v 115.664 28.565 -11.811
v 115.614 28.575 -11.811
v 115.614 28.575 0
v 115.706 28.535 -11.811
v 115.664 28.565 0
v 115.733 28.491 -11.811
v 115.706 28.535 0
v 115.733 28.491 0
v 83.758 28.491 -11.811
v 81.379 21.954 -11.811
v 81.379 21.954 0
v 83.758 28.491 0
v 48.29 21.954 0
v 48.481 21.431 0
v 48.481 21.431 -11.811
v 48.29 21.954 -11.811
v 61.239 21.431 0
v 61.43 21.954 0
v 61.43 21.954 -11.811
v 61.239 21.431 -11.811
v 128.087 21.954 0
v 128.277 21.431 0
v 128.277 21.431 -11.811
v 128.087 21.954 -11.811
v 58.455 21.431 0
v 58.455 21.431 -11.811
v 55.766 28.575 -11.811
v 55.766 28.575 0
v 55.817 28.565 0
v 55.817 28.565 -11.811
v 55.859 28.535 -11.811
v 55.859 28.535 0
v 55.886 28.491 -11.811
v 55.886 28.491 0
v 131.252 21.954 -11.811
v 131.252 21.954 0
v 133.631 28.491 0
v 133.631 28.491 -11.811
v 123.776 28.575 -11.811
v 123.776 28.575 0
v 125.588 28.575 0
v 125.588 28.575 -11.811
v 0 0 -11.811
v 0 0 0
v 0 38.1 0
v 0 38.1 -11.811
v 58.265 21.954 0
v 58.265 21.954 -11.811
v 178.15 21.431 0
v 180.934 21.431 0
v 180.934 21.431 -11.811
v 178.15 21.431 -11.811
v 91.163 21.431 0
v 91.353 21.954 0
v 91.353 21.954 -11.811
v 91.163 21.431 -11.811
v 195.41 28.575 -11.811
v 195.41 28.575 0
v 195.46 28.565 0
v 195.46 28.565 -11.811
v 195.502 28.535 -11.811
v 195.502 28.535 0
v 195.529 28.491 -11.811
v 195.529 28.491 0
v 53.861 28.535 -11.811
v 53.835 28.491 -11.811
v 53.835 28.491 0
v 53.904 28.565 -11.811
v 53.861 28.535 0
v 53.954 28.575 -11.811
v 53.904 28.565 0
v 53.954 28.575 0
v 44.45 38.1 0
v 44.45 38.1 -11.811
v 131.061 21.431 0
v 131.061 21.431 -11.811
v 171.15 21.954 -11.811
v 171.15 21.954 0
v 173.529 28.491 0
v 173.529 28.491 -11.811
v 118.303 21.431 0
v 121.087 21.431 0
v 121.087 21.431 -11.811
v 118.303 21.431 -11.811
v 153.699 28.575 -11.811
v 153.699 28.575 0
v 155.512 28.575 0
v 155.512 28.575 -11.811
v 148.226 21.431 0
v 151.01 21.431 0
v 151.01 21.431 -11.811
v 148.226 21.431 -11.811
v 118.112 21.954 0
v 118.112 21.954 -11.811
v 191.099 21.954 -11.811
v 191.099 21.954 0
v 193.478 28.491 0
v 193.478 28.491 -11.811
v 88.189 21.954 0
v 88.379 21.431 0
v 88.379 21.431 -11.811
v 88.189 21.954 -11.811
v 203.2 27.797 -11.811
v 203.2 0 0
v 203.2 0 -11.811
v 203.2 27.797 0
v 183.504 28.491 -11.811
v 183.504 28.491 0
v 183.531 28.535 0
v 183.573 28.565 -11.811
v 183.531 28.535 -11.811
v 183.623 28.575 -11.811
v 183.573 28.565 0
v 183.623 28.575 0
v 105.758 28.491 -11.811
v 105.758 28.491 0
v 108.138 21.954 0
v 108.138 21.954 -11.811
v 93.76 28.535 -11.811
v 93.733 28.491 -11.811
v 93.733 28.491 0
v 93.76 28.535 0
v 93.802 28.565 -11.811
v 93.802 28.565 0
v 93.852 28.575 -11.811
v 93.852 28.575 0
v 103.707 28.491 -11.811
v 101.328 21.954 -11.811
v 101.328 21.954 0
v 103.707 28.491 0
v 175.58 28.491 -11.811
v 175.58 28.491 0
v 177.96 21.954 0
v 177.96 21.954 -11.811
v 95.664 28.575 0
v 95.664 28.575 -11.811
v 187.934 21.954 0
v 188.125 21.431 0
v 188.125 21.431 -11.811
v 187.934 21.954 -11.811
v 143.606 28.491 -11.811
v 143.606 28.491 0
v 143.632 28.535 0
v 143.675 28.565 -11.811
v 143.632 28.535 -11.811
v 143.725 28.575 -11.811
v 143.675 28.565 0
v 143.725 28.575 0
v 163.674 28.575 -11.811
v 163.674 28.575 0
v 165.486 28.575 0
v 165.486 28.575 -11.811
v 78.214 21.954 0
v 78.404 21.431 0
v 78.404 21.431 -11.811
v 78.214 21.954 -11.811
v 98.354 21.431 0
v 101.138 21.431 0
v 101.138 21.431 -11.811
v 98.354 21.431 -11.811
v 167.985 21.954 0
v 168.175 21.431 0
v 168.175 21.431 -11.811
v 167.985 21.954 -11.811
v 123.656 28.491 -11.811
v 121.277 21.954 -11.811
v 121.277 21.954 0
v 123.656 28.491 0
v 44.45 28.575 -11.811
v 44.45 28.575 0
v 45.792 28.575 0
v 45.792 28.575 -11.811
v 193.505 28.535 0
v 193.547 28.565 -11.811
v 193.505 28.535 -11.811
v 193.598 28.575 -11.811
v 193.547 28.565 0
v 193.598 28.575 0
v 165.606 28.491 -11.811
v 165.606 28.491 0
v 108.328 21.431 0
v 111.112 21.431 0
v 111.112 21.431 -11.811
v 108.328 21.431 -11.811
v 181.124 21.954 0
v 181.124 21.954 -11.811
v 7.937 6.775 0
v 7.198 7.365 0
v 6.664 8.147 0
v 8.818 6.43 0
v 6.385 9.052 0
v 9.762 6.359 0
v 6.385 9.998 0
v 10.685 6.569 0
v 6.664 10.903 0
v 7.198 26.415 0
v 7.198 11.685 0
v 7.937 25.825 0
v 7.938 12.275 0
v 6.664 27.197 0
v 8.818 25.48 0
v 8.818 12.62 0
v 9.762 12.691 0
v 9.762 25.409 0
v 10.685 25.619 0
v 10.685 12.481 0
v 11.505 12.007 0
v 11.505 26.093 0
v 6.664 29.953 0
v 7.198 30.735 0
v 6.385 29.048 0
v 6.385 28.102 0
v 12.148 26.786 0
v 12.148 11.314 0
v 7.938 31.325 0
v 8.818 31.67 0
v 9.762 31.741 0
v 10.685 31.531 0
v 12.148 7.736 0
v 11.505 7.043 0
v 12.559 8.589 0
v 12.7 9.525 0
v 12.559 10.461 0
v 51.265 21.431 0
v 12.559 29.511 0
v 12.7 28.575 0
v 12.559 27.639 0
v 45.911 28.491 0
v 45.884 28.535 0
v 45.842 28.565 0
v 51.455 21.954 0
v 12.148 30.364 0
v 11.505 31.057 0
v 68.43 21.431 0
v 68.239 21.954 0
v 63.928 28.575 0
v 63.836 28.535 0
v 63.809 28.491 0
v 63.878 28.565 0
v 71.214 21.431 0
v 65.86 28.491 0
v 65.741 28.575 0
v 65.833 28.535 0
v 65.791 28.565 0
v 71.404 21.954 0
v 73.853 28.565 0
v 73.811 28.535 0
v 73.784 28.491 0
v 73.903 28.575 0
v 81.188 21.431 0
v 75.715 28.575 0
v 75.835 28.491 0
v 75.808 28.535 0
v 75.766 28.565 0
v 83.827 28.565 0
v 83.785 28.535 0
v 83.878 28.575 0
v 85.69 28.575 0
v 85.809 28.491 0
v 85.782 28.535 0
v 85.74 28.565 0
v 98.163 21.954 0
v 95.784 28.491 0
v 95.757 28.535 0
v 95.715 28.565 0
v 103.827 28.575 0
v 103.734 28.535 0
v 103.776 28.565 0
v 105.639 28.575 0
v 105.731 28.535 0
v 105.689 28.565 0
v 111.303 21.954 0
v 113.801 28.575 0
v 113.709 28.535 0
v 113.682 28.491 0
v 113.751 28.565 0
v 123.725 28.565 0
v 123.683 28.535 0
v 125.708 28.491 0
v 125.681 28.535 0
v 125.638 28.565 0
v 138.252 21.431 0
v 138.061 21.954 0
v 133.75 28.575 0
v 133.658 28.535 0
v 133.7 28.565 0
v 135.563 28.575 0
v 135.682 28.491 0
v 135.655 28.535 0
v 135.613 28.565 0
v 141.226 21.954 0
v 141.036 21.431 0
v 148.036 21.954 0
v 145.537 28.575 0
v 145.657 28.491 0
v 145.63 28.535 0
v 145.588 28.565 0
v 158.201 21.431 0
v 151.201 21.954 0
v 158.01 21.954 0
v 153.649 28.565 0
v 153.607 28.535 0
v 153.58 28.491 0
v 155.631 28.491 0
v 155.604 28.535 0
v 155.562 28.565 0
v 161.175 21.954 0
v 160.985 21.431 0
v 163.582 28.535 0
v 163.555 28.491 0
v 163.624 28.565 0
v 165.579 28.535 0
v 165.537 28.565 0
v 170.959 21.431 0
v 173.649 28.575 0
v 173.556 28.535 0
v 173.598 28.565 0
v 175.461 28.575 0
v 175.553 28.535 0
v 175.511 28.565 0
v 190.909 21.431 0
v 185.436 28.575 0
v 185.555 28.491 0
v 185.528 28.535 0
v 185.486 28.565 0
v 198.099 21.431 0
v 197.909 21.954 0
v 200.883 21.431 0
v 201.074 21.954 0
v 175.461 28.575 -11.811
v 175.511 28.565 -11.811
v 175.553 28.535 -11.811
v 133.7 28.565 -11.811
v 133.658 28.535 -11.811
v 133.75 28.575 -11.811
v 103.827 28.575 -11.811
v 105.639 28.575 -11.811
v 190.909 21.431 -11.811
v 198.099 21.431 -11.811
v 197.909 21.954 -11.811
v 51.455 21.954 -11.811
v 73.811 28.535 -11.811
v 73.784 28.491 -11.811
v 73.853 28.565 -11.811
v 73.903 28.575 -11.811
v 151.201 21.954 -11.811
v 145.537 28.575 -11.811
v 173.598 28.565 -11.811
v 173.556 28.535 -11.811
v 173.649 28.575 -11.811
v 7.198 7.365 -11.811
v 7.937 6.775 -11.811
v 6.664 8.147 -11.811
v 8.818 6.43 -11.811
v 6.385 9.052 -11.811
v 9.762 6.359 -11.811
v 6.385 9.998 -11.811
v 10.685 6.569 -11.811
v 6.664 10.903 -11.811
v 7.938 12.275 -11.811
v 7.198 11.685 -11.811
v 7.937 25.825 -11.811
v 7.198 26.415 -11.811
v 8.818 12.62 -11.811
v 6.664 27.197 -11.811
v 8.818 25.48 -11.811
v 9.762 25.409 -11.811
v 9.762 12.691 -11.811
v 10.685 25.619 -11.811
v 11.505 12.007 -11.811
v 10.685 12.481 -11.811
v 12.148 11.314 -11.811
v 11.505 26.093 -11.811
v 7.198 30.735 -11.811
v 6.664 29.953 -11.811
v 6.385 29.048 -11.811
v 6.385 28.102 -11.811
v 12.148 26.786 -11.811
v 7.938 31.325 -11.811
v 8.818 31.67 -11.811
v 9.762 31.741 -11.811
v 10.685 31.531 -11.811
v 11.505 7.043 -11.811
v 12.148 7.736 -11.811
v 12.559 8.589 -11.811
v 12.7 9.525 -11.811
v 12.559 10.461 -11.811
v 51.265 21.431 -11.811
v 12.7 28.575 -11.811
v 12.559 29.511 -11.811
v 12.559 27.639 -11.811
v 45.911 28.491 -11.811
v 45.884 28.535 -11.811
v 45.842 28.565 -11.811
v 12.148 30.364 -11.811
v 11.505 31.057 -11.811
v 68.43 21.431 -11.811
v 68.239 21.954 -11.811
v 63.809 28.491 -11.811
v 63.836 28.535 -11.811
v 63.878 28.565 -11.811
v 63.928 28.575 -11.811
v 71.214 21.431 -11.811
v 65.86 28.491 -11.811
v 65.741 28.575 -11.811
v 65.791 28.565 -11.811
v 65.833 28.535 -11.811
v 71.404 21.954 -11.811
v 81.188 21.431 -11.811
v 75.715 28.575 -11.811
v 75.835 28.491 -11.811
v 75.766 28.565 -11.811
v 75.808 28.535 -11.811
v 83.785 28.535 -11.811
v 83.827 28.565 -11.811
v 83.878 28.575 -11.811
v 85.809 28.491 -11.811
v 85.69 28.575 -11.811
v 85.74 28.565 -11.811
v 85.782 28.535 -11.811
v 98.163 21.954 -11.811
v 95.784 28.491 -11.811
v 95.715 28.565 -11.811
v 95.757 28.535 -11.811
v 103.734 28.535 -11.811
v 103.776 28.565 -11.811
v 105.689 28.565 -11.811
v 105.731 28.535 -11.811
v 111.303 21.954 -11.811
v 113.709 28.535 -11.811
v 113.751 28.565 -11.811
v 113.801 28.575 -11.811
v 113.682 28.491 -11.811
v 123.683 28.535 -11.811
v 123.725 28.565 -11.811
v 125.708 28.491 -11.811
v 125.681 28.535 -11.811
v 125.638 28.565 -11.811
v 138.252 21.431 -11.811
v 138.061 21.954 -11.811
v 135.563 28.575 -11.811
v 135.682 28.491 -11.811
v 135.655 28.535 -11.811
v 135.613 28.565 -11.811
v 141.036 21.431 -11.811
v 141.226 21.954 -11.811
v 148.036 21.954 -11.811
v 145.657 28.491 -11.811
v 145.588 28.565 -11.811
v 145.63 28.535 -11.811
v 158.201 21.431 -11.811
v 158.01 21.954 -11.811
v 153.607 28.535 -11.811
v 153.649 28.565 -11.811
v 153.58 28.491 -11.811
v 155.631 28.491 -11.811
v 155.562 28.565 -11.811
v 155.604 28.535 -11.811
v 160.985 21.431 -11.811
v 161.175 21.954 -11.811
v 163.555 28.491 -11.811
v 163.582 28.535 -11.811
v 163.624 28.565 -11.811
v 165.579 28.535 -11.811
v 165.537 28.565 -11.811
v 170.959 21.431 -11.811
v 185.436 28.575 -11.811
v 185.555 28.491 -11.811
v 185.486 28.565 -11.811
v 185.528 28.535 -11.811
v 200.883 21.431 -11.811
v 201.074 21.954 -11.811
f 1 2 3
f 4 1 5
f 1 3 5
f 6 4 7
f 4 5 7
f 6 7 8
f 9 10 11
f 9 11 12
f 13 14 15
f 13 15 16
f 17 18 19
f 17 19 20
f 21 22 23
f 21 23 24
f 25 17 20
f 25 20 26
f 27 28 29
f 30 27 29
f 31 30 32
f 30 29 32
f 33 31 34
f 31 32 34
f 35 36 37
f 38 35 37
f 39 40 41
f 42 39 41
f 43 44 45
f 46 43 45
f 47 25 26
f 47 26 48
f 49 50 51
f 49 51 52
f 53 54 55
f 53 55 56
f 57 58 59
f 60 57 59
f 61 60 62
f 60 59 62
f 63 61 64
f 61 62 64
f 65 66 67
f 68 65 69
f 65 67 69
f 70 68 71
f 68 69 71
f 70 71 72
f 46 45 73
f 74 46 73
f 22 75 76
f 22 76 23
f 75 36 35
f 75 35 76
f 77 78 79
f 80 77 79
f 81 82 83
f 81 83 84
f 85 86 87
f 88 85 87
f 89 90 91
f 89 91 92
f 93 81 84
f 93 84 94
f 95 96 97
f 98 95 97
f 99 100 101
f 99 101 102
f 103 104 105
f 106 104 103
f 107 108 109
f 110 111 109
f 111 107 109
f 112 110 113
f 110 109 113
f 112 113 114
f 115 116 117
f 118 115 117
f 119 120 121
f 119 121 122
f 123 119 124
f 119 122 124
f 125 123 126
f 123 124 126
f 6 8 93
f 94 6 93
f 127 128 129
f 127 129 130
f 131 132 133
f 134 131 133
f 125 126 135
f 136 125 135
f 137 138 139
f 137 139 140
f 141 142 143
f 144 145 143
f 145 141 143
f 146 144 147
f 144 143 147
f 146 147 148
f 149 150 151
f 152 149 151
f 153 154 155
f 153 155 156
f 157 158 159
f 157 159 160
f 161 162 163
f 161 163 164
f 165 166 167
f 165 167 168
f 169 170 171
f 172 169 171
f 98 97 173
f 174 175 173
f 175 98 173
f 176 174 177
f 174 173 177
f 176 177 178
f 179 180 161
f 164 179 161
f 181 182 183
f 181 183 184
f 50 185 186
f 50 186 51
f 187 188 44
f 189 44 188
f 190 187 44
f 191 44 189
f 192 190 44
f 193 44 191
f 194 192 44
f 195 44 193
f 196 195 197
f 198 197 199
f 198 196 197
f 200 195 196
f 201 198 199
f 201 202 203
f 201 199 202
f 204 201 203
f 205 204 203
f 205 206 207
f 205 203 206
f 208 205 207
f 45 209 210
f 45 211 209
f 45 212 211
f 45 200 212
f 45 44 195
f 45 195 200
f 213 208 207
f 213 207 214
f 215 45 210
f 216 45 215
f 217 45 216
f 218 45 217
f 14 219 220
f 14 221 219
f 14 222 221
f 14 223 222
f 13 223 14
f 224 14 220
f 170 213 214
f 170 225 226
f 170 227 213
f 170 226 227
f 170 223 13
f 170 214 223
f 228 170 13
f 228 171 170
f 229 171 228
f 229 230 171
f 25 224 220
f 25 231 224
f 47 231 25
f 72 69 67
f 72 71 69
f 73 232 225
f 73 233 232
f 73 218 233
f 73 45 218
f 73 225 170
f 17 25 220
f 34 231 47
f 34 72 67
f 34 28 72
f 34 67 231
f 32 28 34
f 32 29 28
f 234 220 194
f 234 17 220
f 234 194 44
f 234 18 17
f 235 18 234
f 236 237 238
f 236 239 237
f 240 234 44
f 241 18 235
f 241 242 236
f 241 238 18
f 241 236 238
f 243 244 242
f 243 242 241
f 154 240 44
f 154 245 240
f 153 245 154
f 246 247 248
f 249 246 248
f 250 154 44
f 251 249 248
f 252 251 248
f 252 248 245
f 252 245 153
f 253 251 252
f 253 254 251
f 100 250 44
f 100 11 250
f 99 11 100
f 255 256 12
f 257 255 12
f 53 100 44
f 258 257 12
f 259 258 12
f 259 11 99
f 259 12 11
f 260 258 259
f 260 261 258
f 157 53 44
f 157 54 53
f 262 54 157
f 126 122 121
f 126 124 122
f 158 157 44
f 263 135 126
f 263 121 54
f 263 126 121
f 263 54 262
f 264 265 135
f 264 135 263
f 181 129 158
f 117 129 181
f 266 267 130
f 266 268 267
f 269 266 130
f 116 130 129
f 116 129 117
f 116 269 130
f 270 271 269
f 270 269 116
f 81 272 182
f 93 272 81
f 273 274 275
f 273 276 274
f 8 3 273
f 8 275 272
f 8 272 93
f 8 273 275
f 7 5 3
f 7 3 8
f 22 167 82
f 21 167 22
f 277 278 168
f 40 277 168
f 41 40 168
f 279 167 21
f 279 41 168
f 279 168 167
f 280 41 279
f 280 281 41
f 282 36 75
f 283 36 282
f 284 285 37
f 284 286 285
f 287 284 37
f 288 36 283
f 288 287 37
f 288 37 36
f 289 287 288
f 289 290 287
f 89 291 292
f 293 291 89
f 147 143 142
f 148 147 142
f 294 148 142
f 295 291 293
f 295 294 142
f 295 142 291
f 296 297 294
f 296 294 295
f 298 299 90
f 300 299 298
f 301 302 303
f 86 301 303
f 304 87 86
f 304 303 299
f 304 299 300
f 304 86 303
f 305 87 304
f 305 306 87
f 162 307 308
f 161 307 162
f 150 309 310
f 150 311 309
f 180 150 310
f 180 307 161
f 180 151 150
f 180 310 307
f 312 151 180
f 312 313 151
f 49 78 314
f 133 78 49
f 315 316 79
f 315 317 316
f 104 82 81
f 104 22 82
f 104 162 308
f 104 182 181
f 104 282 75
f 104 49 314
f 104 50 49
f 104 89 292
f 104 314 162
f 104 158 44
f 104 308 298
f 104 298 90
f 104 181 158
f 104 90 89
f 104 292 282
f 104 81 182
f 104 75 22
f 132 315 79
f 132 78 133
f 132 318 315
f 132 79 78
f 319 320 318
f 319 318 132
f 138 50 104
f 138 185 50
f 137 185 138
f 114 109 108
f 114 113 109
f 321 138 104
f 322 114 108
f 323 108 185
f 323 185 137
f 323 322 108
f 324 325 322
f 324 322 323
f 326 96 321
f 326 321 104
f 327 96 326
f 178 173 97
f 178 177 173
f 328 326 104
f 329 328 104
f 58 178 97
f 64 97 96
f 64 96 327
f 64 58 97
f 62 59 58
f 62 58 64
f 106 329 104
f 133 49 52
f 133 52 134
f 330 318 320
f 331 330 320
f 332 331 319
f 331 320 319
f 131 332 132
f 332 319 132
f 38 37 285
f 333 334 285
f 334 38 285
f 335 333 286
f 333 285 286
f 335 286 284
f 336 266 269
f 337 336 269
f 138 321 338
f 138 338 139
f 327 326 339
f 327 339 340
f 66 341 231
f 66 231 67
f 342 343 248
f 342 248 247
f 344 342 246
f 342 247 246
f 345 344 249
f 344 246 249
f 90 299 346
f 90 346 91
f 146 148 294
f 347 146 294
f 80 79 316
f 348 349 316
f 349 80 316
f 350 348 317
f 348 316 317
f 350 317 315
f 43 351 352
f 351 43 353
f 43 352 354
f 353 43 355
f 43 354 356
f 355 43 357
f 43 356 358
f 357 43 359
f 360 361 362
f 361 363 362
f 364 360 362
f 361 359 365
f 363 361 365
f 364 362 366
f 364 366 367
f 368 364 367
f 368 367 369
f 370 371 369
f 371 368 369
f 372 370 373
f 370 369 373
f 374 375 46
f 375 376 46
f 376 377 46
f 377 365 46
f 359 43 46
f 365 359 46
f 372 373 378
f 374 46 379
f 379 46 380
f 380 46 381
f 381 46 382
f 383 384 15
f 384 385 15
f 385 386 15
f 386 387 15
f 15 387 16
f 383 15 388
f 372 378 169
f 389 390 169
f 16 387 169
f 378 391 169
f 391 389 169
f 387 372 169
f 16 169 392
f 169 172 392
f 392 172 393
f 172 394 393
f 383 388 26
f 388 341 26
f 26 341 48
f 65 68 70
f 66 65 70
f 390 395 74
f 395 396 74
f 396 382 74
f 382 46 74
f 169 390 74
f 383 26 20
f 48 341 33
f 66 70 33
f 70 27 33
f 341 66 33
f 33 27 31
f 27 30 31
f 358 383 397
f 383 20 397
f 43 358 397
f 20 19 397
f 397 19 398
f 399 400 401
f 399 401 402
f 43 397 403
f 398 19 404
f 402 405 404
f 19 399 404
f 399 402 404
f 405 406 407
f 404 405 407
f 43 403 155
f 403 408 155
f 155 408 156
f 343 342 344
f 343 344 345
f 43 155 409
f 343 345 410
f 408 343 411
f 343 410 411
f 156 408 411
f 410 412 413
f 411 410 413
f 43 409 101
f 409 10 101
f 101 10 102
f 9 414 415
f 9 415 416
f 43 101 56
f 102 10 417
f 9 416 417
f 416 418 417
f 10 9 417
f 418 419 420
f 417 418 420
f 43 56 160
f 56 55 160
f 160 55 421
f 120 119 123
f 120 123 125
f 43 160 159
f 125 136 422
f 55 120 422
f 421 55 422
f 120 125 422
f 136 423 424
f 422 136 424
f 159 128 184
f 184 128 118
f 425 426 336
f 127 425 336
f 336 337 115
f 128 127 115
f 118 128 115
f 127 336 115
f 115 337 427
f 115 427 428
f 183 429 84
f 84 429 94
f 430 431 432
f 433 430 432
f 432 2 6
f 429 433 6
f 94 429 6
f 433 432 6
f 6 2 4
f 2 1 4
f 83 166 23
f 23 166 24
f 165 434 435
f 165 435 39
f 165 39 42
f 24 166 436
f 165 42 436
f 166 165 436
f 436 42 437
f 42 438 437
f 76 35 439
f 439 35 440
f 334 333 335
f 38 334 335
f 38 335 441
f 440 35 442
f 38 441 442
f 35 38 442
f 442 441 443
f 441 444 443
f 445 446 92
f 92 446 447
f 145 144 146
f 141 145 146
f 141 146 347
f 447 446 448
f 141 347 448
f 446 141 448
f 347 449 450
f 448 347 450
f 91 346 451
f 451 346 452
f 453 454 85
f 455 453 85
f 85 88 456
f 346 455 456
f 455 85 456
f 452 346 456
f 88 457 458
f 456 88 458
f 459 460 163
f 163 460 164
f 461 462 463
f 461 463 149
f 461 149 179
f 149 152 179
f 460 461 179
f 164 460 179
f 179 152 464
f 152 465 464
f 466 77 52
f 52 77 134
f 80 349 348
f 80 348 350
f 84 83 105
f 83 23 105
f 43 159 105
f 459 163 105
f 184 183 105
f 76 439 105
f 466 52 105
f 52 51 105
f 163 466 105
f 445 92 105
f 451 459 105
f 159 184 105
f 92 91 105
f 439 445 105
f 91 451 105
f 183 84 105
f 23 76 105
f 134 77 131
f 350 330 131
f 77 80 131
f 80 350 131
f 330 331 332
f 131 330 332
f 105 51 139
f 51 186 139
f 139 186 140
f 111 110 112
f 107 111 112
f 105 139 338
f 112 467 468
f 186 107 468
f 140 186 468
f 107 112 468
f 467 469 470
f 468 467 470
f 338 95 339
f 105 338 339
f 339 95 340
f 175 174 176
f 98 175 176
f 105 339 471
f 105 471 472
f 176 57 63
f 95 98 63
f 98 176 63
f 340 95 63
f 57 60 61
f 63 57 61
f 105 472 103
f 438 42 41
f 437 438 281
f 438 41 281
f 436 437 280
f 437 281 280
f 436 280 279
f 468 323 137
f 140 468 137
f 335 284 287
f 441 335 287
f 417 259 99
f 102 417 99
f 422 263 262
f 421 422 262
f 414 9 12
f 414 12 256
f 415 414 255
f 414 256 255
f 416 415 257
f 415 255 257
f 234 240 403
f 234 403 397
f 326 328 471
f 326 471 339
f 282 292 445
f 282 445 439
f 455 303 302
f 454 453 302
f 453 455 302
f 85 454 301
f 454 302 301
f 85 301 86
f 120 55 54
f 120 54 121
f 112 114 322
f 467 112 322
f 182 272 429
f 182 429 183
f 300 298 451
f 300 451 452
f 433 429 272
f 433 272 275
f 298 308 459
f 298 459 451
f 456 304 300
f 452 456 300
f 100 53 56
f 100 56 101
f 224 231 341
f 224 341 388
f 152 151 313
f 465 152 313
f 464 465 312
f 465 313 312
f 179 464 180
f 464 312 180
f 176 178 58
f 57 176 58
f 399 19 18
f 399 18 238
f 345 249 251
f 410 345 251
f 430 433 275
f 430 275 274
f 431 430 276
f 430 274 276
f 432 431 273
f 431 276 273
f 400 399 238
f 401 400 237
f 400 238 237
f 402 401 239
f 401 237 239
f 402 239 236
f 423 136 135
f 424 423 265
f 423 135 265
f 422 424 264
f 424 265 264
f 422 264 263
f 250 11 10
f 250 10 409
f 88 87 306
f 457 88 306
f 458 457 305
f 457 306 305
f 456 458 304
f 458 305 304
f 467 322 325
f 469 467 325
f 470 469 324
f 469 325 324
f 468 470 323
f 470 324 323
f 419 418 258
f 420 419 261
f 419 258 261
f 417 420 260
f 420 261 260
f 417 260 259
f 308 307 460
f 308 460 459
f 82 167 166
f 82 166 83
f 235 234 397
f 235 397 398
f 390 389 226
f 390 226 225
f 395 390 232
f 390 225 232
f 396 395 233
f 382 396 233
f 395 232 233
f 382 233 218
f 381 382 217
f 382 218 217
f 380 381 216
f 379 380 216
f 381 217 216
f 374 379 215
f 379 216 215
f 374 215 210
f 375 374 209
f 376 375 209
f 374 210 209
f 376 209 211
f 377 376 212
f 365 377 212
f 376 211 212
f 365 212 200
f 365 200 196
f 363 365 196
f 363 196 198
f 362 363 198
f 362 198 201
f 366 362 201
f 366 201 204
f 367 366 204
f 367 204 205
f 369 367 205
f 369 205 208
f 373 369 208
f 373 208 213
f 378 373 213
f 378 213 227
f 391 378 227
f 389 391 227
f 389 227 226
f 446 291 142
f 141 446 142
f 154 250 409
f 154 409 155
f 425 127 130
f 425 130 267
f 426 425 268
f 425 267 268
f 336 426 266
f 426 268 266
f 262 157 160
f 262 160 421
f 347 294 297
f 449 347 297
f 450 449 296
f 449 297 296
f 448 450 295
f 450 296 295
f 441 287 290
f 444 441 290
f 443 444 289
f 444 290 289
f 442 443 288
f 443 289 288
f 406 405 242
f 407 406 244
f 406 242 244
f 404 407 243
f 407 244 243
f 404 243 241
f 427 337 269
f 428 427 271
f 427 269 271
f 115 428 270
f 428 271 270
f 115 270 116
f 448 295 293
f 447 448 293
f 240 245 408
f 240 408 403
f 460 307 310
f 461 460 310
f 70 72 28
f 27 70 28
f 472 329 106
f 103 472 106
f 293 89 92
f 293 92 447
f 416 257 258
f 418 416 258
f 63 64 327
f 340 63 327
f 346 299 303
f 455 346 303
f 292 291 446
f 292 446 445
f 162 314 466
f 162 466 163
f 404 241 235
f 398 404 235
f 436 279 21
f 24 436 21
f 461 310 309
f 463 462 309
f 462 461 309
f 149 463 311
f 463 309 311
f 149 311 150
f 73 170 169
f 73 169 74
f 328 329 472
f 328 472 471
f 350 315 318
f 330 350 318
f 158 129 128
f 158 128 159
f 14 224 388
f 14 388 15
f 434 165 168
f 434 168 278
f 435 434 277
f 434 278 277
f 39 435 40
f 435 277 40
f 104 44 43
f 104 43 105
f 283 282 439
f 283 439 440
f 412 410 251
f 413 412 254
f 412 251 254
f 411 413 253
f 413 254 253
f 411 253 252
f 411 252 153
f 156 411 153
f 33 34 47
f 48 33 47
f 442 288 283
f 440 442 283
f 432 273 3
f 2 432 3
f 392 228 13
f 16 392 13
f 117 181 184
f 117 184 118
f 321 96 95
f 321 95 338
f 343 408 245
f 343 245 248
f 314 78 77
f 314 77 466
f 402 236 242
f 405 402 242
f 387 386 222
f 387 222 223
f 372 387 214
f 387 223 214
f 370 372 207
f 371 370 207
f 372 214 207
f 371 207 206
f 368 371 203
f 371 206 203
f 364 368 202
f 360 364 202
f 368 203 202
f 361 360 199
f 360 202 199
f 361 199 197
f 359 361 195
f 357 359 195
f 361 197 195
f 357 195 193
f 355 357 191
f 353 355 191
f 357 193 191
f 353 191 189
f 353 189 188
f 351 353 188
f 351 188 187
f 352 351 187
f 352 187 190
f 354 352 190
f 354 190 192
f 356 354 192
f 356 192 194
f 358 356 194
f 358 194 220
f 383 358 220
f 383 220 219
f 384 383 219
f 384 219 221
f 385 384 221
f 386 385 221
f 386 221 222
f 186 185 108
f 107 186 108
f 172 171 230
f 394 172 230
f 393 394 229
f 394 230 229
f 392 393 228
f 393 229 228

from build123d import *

# Parameters (mm, degrees)
BLANKSKE_W          = 203.2
BLANKSKE_H          = 28.575
BLANK_DEPTH         = 11.811
TOOTHCUTILL_DEPTH   = 12.811
TOOTHCUTSIM_DEPTH   = 12.811
TEETHCUTS_COUNT     = 22
TEETHCUTS_PITCH     = 9.974556664
SKETCH1_W           = 44.45
SKETCH1_H           = 38.1
BOSS_EXTRUDE1_DEPTH = 11.811
SKETCH2_R           = 3.175
CUT_EXTRUDE1_DEPTH  = 12.811


with BuildPart() as part:
    # BlankSke → Blank (new body)
    with BuildSketch(Plane.XY):
        with Locations((101.6, 14.2875)):
            Rectangle(BLANKSKE_W, BLANKSKE_H)
    extrude(amount=-BLANK_DEPTH)

    # TooCutSkeIll → ToothCutIll (cut, through all)
    with BuildSketch(Plane.XY):
        with BuildLine():
            Line((-3.961730054, 28.491436558), (-1.582427729, 21.954357146))
            ThreePointArc((-1.582427729, 21.954357146), (-1.29135804, 21.575027742), (-0.835353302, 21.43125))
            Line((-0.835353302, 21.43125), (0.835353302, 21.43125))
            ThreePointArc((0.835353302, 21.43125), (1.29135804, 21.575027742), (1.582427729, 21.954357146))
            Line((1.582427729, 21.954357146), (3.961730054, 28.491436558))
            ThreePointArc((3.961730054, 28.491436558), (4.00822681, 28.55203231), (4.081071017, 28.575))
            Line((4.081071017, 28.575), (4.081071017, 28.6004))
            Line((4.081071017, 28.6004), (-4.081071017, 28.6004))
            Line((-4.081071017, 28.6004), (-4.081071017, 28.575))
            ThreePointArc((-4.081071017, 28.575), (-4.00822681, 28.55203231), (-3.961730054, 28.491436558))
        make_face()
    toothcutill = extrude(amount=-TOOTHCUTILL_DEPTH, mode=Mode.SUBTRACT)

    # TooCutSkeSim → ToothCutSim (cut, through all)
    with BuildSketch(Plane.XY):
        Polygon((1.392032299, 21.43125), (-1.392032299, 21.43125), (-4.001389504, 28.6004), (4.001389504, 28.6004), align=None)
    toothcutsim = extrude(amount=-TOOTHCUTSIM_DEPTH, mode=Mode.SUBTRACT)

    # TeethCuts: ToothCutIll, ToothCutSim ×22
    with Locations(*[(i * TEETHCUTS_PITCH, 0, 0) for i in range(1, TEETHCUTS_COUNT)]):
        add(toothcutill, mode=Mode.SUBTRACT)
        add(toothcutsim, mode=Mode.SUBTRACT)

    # Sketch1 → Boss-Extrude1 (add)
    with BuildSketch(Plane.XY):
        with Locations((22.225, 19.05)):
            Rectangle(SKETCH1_W, SKETCH1_H)
    extrude(amount=-BOSS_EXTRUDE1_DEPTH)

    # Sketch2 → Cut-Extrude1 (cut, through all)
    with BuildSketch(Plane.XY):
        with Locations((9.525, 28.575)):
            Circle(SKETCH2_R)
        with Locations((9.525, 9.525)):
            Circle(SKETCH2_R)
    extrude(amount=-CUT_EXTRUDE1_DEPTH, mode=Mode.SUBTRACT)


solid = part.part
